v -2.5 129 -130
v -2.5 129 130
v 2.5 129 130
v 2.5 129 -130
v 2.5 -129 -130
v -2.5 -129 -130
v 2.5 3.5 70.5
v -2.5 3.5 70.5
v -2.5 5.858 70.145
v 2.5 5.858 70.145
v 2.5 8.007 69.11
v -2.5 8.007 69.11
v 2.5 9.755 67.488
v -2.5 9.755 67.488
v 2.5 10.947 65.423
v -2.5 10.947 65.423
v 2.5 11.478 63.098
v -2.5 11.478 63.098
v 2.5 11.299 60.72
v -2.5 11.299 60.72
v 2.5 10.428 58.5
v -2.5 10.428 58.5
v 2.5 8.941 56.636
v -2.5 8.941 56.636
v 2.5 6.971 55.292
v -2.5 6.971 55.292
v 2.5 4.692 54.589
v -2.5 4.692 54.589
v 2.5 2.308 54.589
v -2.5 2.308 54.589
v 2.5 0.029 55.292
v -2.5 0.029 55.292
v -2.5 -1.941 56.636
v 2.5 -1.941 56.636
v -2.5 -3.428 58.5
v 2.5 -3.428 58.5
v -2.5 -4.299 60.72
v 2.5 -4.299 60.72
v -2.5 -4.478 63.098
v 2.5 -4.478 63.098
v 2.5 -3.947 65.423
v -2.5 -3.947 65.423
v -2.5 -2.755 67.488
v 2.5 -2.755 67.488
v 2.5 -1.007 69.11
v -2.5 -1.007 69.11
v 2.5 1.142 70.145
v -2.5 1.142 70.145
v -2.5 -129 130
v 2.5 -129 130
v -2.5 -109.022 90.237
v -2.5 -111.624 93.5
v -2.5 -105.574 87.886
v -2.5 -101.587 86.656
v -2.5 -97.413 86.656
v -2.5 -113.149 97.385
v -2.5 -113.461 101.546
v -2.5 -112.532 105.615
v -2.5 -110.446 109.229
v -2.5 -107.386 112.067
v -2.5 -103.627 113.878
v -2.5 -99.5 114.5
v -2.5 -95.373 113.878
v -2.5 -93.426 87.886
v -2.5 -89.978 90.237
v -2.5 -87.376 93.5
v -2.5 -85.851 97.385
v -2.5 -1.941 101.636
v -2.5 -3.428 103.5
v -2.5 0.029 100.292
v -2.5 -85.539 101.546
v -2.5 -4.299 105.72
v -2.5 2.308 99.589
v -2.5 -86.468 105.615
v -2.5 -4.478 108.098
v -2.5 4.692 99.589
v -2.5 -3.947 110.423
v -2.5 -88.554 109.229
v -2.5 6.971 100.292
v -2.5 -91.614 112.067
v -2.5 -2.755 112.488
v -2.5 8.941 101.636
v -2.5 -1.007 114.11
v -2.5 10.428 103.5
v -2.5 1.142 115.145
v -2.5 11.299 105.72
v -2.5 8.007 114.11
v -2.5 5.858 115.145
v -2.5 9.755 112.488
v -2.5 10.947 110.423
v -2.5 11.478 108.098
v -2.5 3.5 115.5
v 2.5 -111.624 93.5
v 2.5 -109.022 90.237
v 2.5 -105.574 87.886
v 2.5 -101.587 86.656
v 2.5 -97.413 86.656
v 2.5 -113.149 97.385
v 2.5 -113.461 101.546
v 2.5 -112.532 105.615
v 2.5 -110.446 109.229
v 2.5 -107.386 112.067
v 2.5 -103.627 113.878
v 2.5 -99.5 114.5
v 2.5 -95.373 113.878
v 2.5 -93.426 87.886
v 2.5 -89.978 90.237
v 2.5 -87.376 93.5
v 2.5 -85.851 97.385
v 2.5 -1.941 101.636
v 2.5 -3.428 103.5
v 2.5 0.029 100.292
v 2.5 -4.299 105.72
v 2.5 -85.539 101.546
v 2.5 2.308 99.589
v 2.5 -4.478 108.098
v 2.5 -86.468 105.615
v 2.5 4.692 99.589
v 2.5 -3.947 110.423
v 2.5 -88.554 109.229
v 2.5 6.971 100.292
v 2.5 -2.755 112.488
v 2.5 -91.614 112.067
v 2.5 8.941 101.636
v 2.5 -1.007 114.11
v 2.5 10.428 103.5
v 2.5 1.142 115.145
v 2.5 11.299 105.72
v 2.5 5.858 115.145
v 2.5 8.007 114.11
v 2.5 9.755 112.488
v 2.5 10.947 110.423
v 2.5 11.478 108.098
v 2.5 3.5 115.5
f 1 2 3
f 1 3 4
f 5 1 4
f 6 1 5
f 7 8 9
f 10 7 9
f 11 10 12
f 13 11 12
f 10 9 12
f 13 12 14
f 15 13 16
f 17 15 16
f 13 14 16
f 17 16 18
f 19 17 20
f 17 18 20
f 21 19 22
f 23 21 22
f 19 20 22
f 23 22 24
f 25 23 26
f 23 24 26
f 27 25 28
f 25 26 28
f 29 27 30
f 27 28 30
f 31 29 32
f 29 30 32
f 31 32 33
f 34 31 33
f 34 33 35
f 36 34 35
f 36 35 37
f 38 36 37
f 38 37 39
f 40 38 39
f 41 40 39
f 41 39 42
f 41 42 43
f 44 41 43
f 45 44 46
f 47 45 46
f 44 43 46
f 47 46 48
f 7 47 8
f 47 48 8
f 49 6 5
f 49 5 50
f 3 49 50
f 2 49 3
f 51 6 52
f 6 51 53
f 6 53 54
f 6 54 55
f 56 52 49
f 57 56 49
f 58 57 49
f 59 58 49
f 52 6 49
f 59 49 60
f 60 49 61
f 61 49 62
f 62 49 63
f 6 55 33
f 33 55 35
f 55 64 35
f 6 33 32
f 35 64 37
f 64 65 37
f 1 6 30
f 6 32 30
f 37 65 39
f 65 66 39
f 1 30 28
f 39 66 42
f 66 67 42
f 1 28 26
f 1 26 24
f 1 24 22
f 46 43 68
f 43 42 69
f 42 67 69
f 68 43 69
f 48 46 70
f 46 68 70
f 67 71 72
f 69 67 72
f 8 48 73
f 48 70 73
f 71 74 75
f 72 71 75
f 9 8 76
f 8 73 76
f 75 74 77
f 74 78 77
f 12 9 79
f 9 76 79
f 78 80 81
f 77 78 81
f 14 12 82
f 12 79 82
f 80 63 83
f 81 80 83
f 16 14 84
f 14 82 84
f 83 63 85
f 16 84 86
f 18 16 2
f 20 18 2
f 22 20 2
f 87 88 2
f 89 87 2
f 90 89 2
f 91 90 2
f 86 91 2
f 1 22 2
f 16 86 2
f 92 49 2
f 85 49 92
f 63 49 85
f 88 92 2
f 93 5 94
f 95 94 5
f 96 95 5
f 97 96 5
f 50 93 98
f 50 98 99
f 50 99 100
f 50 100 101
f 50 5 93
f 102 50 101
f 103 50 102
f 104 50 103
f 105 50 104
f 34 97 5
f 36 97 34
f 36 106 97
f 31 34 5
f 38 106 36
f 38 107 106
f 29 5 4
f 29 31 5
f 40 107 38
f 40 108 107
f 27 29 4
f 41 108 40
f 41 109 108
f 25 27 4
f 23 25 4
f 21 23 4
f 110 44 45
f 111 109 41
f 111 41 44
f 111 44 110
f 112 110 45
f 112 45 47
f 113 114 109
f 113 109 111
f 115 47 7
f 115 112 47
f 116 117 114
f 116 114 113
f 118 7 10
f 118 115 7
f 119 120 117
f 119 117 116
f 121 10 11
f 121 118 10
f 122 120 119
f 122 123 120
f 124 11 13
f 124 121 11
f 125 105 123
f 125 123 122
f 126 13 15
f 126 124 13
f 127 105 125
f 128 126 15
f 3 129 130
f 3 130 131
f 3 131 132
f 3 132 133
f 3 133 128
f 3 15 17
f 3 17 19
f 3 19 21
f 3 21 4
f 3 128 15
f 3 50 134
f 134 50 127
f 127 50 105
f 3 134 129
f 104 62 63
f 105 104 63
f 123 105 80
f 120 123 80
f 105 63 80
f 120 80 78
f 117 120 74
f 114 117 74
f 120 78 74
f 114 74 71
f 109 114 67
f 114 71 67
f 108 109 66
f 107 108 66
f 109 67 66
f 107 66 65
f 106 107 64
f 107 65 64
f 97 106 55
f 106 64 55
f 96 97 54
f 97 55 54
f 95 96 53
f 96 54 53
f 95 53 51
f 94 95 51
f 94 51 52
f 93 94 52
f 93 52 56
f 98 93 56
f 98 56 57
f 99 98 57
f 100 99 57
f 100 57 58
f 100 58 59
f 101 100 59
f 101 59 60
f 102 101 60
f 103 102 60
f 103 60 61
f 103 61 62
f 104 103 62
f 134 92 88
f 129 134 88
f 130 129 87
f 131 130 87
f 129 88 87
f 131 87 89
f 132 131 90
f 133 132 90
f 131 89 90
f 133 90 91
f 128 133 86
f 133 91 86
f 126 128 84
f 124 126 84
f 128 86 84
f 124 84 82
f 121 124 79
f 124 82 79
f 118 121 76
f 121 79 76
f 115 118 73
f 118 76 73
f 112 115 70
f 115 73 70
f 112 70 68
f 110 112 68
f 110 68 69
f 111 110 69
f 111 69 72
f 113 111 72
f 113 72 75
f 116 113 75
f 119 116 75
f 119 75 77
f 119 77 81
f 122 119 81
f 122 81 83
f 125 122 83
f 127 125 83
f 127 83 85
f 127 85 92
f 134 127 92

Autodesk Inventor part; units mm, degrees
ref_plane "YZ Plane" through (0, 0, 0) normal (1, 0, 0) x (0, 1, 0)
ref_plane "XZ Plane" through (0, 0, 0) normal (0, 1, 0) x (-1, 0, 0)
ref_plane "XY Plane" through (0, 0, 0) normal (0, 0, 1) x (1, 0, 0)
sketch "Sketch1" plane through (0, 0, 0) normal (1, 0, 0) x (0, 1, 0)
  line L0 (-129, 130) -> (129, 130)
  line L1 (129, 130) -> (129, -130)
  line L2 (129, -130) -> (-129, -130)
  line L3 (-129, -130) -> (-129, 130)
  line L4 (-129, 130) -> (129, -130) construction
  line L5 (129, 130) -> (-129, -130) construction
  point P0 (0, 0)
  dimension "d0" = 258
  dimension "d1" = 260
extrude "Extrusion1" add sketch "Sketch1" along normal mid plane 5
sketch "Sketch3" plane through (-2.5, 0, 0) normal (-1, 0, 0) x (0, 0, 1)
  circle A0 centre (100.5, -99.5) radius 16.7557 construction
  line L0 (130, -129) -> (130, 129) construction
  line L1 (-130, -129) -> (130, -129) construction
  circle A1 centre (100.5, -99.5) radius 14
  point P0 (0, 0)
  dimension "d12" = 29.5
  dimension "d13" = 29.5
  dimension "d14" = 28
extrude "Extrusion3" cut sketch "Sketch3" against normal blind 5
sketch "Sketch4" plane through (-2.5, 0, 0) normal (-1, 0, 0) x (0, 0, 1)
  circle A0 centre (107.5, 3.5) radius 12.5 construction
  line L0 (130, -129) -> (130, 129) construction
  line L1 (-130, -129) -> (130, -129) construction
  circle A1 centre (107.5, 3.5) radius 8
  circle A2 centre (62.5, 3.5) radius 12.5 construction
  circle A3 centre (62.5, 3.5) radius 8
  point P0 (0, 0)
  dimension "d17" = 25
  dimension "d18" = 22.5
  dimension "d19" = 132.5
  dimension "d20" = 16
  dimension "d21" = 25
  dimension "d22" = 45
  dimension "d23" = 16
  dimension "d24" = 132.5
extrude "Extrusion4" cut sketch "Sketch4" against normal blind 5
equation "\"d0\" = boxh"
equation "\"d1\" = boxl + 2 * pvct"
equation "\"d2\" = pvct"
equation "\"d14\" = airininner"
equation "\"d15\" = pvct"
equation "\"d17\" = diapowerouter"
equation "\"d20\" = diapower"
equation "\"d21\" = diapowerouter"
equation "\"d23\" = diapower"
equation "\"d25\" = pvct"
equation "\"solhole\" = 3"
equation "\"solholespacing\" = 16"
equation "\"ssolw\" = 63"
equation "\"bsoll\" = 126"
equation "\"bsolw\" = 91"
equation "\"bsolh\" = 126"
equation "\"tapl\" = 31"
equation "\"tl\" = 32"
equation "\"eloboww\" = 25"
equation "\"pvct\" = 5"
equation "\"boxh\" = 258"
equation "\"supporth\" = 15"
equation "\"play\" = 0.5"
equation "\"pcbh\" = 46"
equation "\"pcbw\" = 76"
equation "\"pcbl\" = 86"
equation "\"arl\" = 102"
equation "\"arw\" = 54"
equation "\"psuh\" = 85"
equation "\"screenl\" = 115"
equation "\"screenw\" = 197"
equation "\"seph\" = 105"
equation "\"diapowerouter\" = 25"
equation "\"dialoadouter\" = 25"
equation "\"distpumps\" = 75"
equation "\"diaetapeouter\" = 36"
equation "\"diaphouter\" = 48"
equation "\"distbubblewater\" = 82"
equation "\"diaload\" = 16"
equation "\"diaetape\" = 25"
equation "\"diaph\" = 32"
equation "\"diapower\" = 16"
equation "\"pumpouter\" = 25"
equation "\"airoutinner\" = 28"
equation "\"airoutouter\" = 39"
equation "\"waterouter\" = 39"
equation "\"waterinner\" = 28"
equation "\"pumpinner\" = 16"
equation "\"airininner\" = 28"
equation "\"airinouter\" = 39"
equation "\"boxl\" = 250"
properties part number "sb_side" material "PVC-Piping"
